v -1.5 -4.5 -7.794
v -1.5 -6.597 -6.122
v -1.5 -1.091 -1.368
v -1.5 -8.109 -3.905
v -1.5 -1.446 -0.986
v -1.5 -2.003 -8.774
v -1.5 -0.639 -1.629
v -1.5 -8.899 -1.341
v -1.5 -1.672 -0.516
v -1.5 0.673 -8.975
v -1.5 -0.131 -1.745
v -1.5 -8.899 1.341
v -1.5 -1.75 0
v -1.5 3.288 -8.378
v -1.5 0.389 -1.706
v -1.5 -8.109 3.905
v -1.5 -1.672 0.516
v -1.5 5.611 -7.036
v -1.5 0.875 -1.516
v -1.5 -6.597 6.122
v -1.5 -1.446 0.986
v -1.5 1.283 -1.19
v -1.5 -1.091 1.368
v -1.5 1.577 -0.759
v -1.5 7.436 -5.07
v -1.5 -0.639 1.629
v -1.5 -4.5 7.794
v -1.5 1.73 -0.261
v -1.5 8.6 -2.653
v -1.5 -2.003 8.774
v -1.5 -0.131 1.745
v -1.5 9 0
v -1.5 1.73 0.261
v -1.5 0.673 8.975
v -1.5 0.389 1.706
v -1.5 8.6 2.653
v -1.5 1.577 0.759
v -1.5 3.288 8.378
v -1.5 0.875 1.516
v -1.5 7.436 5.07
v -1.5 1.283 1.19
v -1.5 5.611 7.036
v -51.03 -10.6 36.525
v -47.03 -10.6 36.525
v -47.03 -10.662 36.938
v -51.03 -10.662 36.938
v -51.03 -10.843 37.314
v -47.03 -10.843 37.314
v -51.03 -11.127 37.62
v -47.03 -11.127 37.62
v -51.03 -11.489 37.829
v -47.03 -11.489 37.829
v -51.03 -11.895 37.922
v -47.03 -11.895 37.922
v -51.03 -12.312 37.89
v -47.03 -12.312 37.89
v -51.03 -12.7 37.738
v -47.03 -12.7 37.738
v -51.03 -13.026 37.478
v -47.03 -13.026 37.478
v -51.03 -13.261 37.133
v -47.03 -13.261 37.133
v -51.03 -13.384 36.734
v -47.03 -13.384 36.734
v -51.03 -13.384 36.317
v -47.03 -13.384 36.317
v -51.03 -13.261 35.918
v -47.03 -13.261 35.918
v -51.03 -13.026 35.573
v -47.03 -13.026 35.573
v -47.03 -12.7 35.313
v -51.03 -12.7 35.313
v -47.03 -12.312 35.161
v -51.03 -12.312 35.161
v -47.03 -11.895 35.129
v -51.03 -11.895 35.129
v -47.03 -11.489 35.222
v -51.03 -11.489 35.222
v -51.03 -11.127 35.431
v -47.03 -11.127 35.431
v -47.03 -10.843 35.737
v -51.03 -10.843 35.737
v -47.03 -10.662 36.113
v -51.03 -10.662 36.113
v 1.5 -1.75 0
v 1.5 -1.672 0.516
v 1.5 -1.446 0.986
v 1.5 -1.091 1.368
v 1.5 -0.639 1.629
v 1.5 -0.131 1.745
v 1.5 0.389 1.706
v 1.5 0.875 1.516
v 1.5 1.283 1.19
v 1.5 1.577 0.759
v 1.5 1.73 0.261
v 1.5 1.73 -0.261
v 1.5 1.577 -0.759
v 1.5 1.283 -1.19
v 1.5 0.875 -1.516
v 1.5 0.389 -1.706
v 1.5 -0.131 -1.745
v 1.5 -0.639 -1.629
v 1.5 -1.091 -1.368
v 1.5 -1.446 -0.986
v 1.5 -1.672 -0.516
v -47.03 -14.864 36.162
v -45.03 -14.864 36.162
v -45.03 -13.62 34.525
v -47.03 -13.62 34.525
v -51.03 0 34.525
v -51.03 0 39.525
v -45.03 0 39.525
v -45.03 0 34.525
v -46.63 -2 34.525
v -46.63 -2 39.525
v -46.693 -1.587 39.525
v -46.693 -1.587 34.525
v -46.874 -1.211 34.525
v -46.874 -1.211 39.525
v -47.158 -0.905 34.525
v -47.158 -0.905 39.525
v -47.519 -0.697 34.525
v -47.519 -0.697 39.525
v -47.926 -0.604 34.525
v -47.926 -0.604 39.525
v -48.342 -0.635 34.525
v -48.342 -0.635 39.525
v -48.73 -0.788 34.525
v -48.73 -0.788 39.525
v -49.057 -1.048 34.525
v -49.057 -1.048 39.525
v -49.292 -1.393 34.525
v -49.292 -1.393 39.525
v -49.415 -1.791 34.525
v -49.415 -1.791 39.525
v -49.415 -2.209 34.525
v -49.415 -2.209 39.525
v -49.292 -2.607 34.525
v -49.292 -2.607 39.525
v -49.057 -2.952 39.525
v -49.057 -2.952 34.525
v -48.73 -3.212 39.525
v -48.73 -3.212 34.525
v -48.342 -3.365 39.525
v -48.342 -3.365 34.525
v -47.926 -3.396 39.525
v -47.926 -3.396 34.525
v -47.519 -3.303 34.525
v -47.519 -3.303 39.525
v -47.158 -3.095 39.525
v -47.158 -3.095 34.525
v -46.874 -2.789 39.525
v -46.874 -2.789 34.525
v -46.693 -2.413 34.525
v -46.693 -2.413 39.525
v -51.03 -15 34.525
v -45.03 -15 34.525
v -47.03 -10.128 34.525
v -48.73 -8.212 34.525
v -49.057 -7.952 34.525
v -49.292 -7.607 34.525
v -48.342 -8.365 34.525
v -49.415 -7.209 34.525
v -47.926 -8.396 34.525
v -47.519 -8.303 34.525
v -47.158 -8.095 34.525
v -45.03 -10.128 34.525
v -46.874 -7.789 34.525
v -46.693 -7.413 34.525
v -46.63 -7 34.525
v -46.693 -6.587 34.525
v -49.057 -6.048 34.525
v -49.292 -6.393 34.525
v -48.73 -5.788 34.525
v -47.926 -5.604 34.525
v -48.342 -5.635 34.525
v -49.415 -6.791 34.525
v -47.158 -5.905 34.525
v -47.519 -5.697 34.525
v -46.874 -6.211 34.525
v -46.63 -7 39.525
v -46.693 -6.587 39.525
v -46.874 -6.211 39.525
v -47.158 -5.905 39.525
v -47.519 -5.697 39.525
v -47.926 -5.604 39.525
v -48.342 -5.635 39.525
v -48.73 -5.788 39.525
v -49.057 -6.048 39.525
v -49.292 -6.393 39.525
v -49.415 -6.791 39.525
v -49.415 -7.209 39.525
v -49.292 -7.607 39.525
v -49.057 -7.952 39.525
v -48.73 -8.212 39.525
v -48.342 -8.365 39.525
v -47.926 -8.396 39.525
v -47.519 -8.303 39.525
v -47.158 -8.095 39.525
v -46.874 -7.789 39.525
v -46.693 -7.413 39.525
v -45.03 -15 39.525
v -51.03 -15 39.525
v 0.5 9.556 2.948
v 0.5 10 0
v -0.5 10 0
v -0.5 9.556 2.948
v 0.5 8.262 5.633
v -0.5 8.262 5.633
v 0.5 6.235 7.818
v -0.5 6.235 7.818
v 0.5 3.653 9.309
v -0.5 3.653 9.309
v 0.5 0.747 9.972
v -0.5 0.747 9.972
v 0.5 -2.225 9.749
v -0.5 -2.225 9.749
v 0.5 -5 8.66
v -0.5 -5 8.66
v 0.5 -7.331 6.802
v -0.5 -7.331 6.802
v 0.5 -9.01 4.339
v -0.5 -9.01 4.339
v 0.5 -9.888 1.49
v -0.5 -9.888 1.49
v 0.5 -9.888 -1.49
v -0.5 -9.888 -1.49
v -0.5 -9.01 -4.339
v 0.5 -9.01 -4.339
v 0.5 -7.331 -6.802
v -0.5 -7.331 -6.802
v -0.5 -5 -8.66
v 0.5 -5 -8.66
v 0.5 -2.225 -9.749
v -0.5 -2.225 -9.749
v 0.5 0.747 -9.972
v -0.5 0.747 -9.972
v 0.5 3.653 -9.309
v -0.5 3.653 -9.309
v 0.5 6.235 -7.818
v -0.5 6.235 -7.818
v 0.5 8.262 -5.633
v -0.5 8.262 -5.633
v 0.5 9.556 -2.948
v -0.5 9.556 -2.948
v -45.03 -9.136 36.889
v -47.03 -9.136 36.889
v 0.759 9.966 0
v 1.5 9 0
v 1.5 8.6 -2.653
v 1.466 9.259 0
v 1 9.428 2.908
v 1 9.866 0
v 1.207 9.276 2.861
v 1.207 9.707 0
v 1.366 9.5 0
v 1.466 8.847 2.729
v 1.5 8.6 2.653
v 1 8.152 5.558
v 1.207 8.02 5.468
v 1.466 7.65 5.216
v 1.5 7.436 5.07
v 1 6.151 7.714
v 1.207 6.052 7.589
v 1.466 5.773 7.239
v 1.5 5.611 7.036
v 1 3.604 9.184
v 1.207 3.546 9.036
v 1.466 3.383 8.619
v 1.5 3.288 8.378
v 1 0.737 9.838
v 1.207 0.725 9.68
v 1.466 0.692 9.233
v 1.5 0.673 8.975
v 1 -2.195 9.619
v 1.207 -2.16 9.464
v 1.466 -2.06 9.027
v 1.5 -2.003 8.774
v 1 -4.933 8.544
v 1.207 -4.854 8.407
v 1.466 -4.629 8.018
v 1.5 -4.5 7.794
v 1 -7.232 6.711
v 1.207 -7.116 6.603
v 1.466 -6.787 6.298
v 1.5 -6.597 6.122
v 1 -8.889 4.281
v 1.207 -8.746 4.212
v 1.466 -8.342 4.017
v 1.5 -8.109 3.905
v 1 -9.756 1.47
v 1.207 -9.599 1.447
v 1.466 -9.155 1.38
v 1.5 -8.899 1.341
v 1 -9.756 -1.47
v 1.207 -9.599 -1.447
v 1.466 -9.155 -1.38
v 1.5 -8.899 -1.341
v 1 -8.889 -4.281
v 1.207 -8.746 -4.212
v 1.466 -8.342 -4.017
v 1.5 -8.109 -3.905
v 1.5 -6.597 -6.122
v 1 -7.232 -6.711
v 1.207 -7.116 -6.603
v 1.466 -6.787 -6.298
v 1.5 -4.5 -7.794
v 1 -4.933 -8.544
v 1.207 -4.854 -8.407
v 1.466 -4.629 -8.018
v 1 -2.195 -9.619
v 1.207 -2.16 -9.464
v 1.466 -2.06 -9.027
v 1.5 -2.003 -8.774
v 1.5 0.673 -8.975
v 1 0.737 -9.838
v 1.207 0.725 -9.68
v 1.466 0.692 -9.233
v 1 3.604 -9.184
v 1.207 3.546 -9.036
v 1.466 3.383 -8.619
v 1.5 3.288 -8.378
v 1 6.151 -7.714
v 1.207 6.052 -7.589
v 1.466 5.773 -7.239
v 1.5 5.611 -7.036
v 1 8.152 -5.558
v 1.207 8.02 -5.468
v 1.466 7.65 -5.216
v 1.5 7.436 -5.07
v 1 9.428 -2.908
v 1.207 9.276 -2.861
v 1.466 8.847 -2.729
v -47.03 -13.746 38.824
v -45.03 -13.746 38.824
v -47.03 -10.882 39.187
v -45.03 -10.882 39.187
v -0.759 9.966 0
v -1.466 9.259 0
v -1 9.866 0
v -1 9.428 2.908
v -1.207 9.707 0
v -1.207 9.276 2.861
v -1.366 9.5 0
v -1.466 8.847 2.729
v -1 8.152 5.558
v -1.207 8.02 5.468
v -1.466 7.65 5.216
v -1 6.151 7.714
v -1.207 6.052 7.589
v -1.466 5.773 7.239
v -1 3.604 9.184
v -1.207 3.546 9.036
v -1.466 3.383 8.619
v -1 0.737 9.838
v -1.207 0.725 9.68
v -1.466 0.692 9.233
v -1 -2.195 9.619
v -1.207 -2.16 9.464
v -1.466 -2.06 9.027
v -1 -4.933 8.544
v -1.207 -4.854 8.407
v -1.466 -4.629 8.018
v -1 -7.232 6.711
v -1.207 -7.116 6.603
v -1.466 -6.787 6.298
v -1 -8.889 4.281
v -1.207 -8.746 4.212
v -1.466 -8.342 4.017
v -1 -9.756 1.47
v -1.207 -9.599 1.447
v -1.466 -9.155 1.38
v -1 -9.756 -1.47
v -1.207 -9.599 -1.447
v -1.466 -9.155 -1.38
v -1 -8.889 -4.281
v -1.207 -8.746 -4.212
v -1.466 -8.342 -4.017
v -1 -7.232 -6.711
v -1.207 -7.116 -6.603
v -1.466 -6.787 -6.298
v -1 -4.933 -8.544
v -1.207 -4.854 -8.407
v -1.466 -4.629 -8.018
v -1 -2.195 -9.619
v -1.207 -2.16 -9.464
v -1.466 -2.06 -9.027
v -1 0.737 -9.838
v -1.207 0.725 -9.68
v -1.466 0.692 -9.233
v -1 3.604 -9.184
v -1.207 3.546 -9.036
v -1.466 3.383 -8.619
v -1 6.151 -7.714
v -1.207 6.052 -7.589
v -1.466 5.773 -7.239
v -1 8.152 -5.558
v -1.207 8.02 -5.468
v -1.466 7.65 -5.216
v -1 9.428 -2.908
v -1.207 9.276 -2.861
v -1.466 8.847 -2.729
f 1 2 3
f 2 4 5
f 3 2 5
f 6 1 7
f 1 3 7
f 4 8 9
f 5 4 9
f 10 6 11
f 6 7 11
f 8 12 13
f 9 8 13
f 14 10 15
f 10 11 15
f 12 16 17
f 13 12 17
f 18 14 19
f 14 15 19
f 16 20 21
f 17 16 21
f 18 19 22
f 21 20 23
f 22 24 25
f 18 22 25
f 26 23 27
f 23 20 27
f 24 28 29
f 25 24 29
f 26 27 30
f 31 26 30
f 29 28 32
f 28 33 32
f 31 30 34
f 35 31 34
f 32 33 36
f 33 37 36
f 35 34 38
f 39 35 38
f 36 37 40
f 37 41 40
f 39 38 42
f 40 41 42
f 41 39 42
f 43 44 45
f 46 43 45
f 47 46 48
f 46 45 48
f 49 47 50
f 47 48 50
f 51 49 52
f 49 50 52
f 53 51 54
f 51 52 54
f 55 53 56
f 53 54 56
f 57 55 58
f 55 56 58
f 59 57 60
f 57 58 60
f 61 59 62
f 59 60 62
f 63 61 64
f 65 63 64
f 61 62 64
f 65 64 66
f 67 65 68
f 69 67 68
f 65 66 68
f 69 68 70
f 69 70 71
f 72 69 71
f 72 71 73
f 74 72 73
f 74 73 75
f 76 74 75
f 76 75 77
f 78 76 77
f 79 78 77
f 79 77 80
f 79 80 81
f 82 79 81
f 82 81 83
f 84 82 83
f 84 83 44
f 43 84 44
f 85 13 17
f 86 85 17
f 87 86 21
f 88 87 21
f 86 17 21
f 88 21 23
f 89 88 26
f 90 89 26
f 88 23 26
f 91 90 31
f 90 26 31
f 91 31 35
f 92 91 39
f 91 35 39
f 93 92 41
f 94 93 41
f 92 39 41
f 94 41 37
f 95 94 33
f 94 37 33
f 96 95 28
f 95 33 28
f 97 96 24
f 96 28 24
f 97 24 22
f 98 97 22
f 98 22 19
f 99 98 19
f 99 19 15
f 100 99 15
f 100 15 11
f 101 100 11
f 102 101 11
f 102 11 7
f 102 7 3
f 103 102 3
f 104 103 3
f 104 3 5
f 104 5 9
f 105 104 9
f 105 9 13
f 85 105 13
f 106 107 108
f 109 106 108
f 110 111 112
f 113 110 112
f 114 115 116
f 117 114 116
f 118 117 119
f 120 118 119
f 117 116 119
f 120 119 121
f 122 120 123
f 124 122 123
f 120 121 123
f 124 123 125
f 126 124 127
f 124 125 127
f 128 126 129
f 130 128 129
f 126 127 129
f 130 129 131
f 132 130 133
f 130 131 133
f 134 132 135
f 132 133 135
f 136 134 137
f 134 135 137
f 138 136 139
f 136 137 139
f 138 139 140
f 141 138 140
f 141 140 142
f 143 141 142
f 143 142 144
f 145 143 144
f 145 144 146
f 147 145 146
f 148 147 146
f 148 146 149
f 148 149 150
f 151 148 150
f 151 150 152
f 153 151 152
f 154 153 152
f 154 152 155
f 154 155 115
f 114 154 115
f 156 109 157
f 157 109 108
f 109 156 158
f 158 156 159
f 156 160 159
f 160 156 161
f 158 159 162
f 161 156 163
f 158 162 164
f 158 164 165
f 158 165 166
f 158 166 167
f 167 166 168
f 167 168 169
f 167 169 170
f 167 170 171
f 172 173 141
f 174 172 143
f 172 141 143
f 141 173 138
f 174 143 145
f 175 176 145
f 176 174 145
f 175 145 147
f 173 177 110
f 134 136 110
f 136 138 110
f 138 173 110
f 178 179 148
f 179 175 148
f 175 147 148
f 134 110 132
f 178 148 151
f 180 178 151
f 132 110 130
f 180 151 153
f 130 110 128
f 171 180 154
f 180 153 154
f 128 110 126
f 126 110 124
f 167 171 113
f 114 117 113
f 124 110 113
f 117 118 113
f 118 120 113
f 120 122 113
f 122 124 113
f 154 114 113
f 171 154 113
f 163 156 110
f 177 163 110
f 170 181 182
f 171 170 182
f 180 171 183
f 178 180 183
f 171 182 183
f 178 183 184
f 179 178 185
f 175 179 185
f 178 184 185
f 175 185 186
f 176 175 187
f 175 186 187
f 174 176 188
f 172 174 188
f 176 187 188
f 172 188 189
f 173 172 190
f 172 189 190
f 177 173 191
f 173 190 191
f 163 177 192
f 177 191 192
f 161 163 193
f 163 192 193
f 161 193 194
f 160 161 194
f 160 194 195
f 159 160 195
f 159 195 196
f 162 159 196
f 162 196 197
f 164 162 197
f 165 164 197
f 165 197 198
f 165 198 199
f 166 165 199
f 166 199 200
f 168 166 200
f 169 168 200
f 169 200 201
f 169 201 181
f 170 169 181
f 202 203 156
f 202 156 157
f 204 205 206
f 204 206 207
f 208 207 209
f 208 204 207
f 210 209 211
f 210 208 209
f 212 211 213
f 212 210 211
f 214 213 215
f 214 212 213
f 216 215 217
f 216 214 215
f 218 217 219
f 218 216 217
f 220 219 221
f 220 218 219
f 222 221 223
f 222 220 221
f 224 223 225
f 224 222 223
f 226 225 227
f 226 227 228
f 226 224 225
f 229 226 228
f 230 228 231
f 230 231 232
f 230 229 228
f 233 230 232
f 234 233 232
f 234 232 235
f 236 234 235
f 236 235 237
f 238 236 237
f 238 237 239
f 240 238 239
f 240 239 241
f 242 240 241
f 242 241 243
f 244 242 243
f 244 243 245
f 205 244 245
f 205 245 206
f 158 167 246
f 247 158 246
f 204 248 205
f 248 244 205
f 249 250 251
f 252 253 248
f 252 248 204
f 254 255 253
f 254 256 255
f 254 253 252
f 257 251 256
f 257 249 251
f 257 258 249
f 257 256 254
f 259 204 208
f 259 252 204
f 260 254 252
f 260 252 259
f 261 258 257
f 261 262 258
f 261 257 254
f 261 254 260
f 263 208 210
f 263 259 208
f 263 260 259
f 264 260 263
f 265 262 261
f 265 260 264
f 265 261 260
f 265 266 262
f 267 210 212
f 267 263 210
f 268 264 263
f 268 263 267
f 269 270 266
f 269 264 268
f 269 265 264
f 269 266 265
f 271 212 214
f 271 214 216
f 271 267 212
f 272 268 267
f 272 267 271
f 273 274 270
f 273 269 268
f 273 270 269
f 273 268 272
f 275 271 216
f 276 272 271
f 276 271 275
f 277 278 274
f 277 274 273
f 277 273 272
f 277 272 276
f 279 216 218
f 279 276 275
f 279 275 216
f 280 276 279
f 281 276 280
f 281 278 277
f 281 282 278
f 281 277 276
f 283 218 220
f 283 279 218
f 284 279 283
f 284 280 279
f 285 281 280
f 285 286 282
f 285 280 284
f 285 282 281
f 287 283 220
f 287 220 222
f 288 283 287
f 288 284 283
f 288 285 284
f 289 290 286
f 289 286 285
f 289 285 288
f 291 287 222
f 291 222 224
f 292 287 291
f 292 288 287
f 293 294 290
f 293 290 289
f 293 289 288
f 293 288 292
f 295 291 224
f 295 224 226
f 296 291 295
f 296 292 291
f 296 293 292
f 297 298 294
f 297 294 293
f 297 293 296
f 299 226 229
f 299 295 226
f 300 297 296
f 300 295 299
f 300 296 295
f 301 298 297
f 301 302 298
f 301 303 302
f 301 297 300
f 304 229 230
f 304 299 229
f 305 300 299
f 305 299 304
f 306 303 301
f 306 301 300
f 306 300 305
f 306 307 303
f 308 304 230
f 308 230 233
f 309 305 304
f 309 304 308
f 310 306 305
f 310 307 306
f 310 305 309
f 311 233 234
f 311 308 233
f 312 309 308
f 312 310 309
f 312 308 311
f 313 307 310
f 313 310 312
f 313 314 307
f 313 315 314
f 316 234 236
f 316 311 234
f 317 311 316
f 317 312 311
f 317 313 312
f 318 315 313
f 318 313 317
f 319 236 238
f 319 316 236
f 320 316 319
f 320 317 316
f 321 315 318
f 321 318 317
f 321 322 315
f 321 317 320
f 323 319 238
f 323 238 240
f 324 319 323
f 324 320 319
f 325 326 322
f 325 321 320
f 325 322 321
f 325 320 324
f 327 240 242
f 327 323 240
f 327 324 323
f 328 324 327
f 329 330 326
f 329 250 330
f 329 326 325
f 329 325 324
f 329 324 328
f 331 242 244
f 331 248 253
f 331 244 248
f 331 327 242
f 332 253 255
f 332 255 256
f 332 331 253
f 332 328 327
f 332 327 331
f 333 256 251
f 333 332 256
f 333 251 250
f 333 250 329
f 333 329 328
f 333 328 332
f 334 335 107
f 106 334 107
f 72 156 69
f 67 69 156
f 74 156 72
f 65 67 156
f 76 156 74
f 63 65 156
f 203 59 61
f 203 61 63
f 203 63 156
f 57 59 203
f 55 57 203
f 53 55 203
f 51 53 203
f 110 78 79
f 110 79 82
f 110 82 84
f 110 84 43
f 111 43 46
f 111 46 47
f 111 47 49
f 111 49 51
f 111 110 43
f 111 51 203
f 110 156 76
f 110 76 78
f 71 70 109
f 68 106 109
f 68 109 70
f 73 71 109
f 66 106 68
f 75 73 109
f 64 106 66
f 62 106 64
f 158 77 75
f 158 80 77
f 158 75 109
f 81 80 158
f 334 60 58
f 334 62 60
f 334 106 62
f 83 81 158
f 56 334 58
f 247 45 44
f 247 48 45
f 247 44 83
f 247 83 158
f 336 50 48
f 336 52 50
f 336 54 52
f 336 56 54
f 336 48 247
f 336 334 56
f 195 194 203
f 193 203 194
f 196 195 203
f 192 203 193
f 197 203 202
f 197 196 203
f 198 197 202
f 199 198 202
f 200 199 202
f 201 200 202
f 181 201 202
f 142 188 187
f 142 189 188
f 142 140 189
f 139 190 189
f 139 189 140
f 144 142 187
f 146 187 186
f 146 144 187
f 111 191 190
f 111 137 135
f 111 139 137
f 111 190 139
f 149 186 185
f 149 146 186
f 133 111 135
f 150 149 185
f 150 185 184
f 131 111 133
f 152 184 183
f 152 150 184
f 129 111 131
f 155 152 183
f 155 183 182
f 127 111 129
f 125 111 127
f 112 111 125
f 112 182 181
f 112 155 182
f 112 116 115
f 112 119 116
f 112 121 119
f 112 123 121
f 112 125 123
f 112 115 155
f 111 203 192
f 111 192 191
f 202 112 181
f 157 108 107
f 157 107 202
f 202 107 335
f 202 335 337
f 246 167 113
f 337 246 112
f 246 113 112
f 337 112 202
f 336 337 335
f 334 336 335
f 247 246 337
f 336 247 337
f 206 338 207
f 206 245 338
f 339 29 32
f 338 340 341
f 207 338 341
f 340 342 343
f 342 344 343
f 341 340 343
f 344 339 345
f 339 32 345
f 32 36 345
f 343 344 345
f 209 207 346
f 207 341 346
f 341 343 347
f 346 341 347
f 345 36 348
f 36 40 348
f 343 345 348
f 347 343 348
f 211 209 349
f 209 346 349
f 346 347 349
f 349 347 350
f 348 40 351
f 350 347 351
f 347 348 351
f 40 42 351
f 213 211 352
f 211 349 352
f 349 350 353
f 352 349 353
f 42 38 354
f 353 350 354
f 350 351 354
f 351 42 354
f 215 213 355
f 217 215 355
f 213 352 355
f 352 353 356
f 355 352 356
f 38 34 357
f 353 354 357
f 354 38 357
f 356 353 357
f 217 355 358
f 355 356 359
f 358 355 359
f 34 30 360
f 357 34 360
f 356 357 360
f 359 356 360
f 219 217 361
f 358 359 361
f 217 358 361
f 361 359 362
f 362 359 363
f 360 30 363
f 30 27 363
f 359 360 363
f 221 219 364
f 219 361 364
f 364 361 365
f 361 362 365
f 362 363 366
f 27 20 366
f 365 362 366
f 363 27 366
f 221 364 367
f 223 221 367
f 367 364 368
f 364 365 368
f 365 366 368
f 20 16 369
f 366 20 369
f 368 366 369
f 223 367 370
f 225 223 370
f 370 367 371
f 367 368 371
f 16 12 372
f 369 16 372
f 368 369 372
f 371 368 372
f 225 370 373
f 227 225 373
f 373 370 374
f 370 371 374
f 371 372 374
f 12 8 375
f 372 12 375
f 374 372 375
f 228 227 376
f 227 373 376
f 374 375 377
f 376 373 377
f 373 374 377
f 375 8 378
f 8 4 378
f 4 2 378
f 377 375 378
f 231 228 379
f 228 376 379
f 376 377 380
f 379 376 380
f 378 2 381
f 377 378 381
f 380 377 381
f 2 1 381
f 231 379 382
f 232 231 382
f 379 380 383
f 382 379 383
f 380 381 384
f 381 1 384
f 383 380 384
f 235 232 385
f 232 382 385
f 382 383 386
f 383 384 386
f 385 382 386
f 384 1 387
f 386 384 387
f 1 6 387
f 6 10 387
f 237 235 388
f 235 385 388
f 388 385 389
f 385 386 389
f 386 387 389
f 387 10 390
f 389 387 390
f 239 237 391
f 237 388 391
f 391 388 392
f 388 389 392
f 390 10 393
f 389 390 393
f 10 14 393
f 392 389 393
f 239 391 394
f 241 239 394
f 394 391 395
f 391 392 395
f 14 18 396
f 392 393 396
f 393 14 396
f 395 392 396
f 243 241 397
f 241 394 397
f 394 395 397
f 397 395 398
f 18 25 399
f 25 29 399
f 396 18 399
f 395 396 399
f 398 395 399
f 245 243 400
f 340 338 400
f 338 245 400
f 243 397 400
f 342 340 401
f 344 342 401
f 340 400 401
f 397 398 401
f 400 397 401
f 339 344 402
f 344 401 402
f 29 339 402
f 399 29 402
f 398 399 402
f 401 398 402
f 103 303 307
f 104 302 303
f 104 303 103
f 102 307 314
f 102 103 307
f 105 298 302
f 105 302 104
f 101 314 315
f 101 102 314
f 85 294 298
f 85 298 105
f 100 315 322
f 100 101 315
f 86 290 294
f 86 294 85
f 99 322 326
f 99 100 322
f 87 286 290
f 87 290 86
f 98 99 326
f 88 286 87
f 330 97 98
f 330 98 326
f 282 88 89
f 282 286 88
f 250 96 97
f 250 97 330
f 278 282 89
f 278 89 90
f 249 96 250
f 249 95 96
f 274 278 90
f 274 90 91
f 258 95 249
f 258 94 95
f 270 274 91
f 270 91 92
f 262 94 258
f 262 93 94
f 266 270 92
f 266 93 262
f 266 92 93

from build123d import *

# Parameters (mm, degrees)
F0_R      = 10
F1_DEPTH  = 1.5
F2_R      = 1.75
F3_DEPTH  = 3.001
F4_W      = 6
F4_H      = 5
F5_DEPTH  = 15
F6_R      = 1.4
F7_DEPTH  = 49.52649
F9_R      = 1
F8_R      = 1.4
F10_DEPTH = 6.001
F11_DEPTH = 2


with BuildPart() as f1:
    # F0 (on Right) → F1 (new body, symmetric)
    with BuildSketch(Plane.YZ):
        Circle(F0_R)
    extrude(amount=F1_DEPTH, both=True)

    # F2 (on face) → F3 (cut, through all)
    with BuildSketch(Plane(origin=(-1.5, 0, 0), x_dir=(0, -1, 0), z_dir=(-1, 0, 0))):
        Circle(F2_R)
    extrude(amount=-F3_DEPTH, mode=Mode.SUBTRACT)

    # F9
    f9_edges = [f1.edges().sort_by_distance(p)[0] for p in [
        (1.5, -10, 0),
        (-1.5, -10, 0),
    ]]
    fillet(f9_edges, radius=F9_R)


with BuildPart() as f5:
    # F4 (on Front) → F5 (new body)
    with BuildSketch(Plane.XZ):
        with Locations((-48.030434, 37.02549)):
            Rectangle(F4_W, F4_H)
    extrude(amount=F5_DEPTH)

    # F6 (on face) → F7 (cut, through all)
    with BuildSketch(Plane.XY.offset(39.52549)):
        with Locations((-48.030434, -2)):
            Circle(F6_R)
        with Locations((-48.030434, -7)):
            Circle(F6_R)
    extrude(amount=-F7_DEPTH, mode=Mode.SUBTRACT)

    # F8 (on face) → F10 (cut, through all)
    with BuildSketch(Plane.YZ.offset(-45.030434)):
        with Locations((-12, 36.52549)):
            Circle(F8_R)
    extrude(amount=-F10_DEPTH, mode=Mode.SUBTRACT)

    # F8 (on face) → F11 (cut)
    with BuildSketch(Plane.YZ.offset(-45.030434)):
        Polygon((-14.863833, 36.162456), (-13.620201, 34.52549), (-10.128303, 34.52549), (-9.136167, 36.888525), (-10.88248, 39.18716), (-13.746313, 38.824126), align=None)
        with Locations((-12, 36.52549)):
            Circle(F8_R, mode=Mode.SUBTRACT)
    extrude(amount=-F11_DEPTH, mode=Mode.SUBTRACT)


solid = Compound([f1.part, f5.part])
